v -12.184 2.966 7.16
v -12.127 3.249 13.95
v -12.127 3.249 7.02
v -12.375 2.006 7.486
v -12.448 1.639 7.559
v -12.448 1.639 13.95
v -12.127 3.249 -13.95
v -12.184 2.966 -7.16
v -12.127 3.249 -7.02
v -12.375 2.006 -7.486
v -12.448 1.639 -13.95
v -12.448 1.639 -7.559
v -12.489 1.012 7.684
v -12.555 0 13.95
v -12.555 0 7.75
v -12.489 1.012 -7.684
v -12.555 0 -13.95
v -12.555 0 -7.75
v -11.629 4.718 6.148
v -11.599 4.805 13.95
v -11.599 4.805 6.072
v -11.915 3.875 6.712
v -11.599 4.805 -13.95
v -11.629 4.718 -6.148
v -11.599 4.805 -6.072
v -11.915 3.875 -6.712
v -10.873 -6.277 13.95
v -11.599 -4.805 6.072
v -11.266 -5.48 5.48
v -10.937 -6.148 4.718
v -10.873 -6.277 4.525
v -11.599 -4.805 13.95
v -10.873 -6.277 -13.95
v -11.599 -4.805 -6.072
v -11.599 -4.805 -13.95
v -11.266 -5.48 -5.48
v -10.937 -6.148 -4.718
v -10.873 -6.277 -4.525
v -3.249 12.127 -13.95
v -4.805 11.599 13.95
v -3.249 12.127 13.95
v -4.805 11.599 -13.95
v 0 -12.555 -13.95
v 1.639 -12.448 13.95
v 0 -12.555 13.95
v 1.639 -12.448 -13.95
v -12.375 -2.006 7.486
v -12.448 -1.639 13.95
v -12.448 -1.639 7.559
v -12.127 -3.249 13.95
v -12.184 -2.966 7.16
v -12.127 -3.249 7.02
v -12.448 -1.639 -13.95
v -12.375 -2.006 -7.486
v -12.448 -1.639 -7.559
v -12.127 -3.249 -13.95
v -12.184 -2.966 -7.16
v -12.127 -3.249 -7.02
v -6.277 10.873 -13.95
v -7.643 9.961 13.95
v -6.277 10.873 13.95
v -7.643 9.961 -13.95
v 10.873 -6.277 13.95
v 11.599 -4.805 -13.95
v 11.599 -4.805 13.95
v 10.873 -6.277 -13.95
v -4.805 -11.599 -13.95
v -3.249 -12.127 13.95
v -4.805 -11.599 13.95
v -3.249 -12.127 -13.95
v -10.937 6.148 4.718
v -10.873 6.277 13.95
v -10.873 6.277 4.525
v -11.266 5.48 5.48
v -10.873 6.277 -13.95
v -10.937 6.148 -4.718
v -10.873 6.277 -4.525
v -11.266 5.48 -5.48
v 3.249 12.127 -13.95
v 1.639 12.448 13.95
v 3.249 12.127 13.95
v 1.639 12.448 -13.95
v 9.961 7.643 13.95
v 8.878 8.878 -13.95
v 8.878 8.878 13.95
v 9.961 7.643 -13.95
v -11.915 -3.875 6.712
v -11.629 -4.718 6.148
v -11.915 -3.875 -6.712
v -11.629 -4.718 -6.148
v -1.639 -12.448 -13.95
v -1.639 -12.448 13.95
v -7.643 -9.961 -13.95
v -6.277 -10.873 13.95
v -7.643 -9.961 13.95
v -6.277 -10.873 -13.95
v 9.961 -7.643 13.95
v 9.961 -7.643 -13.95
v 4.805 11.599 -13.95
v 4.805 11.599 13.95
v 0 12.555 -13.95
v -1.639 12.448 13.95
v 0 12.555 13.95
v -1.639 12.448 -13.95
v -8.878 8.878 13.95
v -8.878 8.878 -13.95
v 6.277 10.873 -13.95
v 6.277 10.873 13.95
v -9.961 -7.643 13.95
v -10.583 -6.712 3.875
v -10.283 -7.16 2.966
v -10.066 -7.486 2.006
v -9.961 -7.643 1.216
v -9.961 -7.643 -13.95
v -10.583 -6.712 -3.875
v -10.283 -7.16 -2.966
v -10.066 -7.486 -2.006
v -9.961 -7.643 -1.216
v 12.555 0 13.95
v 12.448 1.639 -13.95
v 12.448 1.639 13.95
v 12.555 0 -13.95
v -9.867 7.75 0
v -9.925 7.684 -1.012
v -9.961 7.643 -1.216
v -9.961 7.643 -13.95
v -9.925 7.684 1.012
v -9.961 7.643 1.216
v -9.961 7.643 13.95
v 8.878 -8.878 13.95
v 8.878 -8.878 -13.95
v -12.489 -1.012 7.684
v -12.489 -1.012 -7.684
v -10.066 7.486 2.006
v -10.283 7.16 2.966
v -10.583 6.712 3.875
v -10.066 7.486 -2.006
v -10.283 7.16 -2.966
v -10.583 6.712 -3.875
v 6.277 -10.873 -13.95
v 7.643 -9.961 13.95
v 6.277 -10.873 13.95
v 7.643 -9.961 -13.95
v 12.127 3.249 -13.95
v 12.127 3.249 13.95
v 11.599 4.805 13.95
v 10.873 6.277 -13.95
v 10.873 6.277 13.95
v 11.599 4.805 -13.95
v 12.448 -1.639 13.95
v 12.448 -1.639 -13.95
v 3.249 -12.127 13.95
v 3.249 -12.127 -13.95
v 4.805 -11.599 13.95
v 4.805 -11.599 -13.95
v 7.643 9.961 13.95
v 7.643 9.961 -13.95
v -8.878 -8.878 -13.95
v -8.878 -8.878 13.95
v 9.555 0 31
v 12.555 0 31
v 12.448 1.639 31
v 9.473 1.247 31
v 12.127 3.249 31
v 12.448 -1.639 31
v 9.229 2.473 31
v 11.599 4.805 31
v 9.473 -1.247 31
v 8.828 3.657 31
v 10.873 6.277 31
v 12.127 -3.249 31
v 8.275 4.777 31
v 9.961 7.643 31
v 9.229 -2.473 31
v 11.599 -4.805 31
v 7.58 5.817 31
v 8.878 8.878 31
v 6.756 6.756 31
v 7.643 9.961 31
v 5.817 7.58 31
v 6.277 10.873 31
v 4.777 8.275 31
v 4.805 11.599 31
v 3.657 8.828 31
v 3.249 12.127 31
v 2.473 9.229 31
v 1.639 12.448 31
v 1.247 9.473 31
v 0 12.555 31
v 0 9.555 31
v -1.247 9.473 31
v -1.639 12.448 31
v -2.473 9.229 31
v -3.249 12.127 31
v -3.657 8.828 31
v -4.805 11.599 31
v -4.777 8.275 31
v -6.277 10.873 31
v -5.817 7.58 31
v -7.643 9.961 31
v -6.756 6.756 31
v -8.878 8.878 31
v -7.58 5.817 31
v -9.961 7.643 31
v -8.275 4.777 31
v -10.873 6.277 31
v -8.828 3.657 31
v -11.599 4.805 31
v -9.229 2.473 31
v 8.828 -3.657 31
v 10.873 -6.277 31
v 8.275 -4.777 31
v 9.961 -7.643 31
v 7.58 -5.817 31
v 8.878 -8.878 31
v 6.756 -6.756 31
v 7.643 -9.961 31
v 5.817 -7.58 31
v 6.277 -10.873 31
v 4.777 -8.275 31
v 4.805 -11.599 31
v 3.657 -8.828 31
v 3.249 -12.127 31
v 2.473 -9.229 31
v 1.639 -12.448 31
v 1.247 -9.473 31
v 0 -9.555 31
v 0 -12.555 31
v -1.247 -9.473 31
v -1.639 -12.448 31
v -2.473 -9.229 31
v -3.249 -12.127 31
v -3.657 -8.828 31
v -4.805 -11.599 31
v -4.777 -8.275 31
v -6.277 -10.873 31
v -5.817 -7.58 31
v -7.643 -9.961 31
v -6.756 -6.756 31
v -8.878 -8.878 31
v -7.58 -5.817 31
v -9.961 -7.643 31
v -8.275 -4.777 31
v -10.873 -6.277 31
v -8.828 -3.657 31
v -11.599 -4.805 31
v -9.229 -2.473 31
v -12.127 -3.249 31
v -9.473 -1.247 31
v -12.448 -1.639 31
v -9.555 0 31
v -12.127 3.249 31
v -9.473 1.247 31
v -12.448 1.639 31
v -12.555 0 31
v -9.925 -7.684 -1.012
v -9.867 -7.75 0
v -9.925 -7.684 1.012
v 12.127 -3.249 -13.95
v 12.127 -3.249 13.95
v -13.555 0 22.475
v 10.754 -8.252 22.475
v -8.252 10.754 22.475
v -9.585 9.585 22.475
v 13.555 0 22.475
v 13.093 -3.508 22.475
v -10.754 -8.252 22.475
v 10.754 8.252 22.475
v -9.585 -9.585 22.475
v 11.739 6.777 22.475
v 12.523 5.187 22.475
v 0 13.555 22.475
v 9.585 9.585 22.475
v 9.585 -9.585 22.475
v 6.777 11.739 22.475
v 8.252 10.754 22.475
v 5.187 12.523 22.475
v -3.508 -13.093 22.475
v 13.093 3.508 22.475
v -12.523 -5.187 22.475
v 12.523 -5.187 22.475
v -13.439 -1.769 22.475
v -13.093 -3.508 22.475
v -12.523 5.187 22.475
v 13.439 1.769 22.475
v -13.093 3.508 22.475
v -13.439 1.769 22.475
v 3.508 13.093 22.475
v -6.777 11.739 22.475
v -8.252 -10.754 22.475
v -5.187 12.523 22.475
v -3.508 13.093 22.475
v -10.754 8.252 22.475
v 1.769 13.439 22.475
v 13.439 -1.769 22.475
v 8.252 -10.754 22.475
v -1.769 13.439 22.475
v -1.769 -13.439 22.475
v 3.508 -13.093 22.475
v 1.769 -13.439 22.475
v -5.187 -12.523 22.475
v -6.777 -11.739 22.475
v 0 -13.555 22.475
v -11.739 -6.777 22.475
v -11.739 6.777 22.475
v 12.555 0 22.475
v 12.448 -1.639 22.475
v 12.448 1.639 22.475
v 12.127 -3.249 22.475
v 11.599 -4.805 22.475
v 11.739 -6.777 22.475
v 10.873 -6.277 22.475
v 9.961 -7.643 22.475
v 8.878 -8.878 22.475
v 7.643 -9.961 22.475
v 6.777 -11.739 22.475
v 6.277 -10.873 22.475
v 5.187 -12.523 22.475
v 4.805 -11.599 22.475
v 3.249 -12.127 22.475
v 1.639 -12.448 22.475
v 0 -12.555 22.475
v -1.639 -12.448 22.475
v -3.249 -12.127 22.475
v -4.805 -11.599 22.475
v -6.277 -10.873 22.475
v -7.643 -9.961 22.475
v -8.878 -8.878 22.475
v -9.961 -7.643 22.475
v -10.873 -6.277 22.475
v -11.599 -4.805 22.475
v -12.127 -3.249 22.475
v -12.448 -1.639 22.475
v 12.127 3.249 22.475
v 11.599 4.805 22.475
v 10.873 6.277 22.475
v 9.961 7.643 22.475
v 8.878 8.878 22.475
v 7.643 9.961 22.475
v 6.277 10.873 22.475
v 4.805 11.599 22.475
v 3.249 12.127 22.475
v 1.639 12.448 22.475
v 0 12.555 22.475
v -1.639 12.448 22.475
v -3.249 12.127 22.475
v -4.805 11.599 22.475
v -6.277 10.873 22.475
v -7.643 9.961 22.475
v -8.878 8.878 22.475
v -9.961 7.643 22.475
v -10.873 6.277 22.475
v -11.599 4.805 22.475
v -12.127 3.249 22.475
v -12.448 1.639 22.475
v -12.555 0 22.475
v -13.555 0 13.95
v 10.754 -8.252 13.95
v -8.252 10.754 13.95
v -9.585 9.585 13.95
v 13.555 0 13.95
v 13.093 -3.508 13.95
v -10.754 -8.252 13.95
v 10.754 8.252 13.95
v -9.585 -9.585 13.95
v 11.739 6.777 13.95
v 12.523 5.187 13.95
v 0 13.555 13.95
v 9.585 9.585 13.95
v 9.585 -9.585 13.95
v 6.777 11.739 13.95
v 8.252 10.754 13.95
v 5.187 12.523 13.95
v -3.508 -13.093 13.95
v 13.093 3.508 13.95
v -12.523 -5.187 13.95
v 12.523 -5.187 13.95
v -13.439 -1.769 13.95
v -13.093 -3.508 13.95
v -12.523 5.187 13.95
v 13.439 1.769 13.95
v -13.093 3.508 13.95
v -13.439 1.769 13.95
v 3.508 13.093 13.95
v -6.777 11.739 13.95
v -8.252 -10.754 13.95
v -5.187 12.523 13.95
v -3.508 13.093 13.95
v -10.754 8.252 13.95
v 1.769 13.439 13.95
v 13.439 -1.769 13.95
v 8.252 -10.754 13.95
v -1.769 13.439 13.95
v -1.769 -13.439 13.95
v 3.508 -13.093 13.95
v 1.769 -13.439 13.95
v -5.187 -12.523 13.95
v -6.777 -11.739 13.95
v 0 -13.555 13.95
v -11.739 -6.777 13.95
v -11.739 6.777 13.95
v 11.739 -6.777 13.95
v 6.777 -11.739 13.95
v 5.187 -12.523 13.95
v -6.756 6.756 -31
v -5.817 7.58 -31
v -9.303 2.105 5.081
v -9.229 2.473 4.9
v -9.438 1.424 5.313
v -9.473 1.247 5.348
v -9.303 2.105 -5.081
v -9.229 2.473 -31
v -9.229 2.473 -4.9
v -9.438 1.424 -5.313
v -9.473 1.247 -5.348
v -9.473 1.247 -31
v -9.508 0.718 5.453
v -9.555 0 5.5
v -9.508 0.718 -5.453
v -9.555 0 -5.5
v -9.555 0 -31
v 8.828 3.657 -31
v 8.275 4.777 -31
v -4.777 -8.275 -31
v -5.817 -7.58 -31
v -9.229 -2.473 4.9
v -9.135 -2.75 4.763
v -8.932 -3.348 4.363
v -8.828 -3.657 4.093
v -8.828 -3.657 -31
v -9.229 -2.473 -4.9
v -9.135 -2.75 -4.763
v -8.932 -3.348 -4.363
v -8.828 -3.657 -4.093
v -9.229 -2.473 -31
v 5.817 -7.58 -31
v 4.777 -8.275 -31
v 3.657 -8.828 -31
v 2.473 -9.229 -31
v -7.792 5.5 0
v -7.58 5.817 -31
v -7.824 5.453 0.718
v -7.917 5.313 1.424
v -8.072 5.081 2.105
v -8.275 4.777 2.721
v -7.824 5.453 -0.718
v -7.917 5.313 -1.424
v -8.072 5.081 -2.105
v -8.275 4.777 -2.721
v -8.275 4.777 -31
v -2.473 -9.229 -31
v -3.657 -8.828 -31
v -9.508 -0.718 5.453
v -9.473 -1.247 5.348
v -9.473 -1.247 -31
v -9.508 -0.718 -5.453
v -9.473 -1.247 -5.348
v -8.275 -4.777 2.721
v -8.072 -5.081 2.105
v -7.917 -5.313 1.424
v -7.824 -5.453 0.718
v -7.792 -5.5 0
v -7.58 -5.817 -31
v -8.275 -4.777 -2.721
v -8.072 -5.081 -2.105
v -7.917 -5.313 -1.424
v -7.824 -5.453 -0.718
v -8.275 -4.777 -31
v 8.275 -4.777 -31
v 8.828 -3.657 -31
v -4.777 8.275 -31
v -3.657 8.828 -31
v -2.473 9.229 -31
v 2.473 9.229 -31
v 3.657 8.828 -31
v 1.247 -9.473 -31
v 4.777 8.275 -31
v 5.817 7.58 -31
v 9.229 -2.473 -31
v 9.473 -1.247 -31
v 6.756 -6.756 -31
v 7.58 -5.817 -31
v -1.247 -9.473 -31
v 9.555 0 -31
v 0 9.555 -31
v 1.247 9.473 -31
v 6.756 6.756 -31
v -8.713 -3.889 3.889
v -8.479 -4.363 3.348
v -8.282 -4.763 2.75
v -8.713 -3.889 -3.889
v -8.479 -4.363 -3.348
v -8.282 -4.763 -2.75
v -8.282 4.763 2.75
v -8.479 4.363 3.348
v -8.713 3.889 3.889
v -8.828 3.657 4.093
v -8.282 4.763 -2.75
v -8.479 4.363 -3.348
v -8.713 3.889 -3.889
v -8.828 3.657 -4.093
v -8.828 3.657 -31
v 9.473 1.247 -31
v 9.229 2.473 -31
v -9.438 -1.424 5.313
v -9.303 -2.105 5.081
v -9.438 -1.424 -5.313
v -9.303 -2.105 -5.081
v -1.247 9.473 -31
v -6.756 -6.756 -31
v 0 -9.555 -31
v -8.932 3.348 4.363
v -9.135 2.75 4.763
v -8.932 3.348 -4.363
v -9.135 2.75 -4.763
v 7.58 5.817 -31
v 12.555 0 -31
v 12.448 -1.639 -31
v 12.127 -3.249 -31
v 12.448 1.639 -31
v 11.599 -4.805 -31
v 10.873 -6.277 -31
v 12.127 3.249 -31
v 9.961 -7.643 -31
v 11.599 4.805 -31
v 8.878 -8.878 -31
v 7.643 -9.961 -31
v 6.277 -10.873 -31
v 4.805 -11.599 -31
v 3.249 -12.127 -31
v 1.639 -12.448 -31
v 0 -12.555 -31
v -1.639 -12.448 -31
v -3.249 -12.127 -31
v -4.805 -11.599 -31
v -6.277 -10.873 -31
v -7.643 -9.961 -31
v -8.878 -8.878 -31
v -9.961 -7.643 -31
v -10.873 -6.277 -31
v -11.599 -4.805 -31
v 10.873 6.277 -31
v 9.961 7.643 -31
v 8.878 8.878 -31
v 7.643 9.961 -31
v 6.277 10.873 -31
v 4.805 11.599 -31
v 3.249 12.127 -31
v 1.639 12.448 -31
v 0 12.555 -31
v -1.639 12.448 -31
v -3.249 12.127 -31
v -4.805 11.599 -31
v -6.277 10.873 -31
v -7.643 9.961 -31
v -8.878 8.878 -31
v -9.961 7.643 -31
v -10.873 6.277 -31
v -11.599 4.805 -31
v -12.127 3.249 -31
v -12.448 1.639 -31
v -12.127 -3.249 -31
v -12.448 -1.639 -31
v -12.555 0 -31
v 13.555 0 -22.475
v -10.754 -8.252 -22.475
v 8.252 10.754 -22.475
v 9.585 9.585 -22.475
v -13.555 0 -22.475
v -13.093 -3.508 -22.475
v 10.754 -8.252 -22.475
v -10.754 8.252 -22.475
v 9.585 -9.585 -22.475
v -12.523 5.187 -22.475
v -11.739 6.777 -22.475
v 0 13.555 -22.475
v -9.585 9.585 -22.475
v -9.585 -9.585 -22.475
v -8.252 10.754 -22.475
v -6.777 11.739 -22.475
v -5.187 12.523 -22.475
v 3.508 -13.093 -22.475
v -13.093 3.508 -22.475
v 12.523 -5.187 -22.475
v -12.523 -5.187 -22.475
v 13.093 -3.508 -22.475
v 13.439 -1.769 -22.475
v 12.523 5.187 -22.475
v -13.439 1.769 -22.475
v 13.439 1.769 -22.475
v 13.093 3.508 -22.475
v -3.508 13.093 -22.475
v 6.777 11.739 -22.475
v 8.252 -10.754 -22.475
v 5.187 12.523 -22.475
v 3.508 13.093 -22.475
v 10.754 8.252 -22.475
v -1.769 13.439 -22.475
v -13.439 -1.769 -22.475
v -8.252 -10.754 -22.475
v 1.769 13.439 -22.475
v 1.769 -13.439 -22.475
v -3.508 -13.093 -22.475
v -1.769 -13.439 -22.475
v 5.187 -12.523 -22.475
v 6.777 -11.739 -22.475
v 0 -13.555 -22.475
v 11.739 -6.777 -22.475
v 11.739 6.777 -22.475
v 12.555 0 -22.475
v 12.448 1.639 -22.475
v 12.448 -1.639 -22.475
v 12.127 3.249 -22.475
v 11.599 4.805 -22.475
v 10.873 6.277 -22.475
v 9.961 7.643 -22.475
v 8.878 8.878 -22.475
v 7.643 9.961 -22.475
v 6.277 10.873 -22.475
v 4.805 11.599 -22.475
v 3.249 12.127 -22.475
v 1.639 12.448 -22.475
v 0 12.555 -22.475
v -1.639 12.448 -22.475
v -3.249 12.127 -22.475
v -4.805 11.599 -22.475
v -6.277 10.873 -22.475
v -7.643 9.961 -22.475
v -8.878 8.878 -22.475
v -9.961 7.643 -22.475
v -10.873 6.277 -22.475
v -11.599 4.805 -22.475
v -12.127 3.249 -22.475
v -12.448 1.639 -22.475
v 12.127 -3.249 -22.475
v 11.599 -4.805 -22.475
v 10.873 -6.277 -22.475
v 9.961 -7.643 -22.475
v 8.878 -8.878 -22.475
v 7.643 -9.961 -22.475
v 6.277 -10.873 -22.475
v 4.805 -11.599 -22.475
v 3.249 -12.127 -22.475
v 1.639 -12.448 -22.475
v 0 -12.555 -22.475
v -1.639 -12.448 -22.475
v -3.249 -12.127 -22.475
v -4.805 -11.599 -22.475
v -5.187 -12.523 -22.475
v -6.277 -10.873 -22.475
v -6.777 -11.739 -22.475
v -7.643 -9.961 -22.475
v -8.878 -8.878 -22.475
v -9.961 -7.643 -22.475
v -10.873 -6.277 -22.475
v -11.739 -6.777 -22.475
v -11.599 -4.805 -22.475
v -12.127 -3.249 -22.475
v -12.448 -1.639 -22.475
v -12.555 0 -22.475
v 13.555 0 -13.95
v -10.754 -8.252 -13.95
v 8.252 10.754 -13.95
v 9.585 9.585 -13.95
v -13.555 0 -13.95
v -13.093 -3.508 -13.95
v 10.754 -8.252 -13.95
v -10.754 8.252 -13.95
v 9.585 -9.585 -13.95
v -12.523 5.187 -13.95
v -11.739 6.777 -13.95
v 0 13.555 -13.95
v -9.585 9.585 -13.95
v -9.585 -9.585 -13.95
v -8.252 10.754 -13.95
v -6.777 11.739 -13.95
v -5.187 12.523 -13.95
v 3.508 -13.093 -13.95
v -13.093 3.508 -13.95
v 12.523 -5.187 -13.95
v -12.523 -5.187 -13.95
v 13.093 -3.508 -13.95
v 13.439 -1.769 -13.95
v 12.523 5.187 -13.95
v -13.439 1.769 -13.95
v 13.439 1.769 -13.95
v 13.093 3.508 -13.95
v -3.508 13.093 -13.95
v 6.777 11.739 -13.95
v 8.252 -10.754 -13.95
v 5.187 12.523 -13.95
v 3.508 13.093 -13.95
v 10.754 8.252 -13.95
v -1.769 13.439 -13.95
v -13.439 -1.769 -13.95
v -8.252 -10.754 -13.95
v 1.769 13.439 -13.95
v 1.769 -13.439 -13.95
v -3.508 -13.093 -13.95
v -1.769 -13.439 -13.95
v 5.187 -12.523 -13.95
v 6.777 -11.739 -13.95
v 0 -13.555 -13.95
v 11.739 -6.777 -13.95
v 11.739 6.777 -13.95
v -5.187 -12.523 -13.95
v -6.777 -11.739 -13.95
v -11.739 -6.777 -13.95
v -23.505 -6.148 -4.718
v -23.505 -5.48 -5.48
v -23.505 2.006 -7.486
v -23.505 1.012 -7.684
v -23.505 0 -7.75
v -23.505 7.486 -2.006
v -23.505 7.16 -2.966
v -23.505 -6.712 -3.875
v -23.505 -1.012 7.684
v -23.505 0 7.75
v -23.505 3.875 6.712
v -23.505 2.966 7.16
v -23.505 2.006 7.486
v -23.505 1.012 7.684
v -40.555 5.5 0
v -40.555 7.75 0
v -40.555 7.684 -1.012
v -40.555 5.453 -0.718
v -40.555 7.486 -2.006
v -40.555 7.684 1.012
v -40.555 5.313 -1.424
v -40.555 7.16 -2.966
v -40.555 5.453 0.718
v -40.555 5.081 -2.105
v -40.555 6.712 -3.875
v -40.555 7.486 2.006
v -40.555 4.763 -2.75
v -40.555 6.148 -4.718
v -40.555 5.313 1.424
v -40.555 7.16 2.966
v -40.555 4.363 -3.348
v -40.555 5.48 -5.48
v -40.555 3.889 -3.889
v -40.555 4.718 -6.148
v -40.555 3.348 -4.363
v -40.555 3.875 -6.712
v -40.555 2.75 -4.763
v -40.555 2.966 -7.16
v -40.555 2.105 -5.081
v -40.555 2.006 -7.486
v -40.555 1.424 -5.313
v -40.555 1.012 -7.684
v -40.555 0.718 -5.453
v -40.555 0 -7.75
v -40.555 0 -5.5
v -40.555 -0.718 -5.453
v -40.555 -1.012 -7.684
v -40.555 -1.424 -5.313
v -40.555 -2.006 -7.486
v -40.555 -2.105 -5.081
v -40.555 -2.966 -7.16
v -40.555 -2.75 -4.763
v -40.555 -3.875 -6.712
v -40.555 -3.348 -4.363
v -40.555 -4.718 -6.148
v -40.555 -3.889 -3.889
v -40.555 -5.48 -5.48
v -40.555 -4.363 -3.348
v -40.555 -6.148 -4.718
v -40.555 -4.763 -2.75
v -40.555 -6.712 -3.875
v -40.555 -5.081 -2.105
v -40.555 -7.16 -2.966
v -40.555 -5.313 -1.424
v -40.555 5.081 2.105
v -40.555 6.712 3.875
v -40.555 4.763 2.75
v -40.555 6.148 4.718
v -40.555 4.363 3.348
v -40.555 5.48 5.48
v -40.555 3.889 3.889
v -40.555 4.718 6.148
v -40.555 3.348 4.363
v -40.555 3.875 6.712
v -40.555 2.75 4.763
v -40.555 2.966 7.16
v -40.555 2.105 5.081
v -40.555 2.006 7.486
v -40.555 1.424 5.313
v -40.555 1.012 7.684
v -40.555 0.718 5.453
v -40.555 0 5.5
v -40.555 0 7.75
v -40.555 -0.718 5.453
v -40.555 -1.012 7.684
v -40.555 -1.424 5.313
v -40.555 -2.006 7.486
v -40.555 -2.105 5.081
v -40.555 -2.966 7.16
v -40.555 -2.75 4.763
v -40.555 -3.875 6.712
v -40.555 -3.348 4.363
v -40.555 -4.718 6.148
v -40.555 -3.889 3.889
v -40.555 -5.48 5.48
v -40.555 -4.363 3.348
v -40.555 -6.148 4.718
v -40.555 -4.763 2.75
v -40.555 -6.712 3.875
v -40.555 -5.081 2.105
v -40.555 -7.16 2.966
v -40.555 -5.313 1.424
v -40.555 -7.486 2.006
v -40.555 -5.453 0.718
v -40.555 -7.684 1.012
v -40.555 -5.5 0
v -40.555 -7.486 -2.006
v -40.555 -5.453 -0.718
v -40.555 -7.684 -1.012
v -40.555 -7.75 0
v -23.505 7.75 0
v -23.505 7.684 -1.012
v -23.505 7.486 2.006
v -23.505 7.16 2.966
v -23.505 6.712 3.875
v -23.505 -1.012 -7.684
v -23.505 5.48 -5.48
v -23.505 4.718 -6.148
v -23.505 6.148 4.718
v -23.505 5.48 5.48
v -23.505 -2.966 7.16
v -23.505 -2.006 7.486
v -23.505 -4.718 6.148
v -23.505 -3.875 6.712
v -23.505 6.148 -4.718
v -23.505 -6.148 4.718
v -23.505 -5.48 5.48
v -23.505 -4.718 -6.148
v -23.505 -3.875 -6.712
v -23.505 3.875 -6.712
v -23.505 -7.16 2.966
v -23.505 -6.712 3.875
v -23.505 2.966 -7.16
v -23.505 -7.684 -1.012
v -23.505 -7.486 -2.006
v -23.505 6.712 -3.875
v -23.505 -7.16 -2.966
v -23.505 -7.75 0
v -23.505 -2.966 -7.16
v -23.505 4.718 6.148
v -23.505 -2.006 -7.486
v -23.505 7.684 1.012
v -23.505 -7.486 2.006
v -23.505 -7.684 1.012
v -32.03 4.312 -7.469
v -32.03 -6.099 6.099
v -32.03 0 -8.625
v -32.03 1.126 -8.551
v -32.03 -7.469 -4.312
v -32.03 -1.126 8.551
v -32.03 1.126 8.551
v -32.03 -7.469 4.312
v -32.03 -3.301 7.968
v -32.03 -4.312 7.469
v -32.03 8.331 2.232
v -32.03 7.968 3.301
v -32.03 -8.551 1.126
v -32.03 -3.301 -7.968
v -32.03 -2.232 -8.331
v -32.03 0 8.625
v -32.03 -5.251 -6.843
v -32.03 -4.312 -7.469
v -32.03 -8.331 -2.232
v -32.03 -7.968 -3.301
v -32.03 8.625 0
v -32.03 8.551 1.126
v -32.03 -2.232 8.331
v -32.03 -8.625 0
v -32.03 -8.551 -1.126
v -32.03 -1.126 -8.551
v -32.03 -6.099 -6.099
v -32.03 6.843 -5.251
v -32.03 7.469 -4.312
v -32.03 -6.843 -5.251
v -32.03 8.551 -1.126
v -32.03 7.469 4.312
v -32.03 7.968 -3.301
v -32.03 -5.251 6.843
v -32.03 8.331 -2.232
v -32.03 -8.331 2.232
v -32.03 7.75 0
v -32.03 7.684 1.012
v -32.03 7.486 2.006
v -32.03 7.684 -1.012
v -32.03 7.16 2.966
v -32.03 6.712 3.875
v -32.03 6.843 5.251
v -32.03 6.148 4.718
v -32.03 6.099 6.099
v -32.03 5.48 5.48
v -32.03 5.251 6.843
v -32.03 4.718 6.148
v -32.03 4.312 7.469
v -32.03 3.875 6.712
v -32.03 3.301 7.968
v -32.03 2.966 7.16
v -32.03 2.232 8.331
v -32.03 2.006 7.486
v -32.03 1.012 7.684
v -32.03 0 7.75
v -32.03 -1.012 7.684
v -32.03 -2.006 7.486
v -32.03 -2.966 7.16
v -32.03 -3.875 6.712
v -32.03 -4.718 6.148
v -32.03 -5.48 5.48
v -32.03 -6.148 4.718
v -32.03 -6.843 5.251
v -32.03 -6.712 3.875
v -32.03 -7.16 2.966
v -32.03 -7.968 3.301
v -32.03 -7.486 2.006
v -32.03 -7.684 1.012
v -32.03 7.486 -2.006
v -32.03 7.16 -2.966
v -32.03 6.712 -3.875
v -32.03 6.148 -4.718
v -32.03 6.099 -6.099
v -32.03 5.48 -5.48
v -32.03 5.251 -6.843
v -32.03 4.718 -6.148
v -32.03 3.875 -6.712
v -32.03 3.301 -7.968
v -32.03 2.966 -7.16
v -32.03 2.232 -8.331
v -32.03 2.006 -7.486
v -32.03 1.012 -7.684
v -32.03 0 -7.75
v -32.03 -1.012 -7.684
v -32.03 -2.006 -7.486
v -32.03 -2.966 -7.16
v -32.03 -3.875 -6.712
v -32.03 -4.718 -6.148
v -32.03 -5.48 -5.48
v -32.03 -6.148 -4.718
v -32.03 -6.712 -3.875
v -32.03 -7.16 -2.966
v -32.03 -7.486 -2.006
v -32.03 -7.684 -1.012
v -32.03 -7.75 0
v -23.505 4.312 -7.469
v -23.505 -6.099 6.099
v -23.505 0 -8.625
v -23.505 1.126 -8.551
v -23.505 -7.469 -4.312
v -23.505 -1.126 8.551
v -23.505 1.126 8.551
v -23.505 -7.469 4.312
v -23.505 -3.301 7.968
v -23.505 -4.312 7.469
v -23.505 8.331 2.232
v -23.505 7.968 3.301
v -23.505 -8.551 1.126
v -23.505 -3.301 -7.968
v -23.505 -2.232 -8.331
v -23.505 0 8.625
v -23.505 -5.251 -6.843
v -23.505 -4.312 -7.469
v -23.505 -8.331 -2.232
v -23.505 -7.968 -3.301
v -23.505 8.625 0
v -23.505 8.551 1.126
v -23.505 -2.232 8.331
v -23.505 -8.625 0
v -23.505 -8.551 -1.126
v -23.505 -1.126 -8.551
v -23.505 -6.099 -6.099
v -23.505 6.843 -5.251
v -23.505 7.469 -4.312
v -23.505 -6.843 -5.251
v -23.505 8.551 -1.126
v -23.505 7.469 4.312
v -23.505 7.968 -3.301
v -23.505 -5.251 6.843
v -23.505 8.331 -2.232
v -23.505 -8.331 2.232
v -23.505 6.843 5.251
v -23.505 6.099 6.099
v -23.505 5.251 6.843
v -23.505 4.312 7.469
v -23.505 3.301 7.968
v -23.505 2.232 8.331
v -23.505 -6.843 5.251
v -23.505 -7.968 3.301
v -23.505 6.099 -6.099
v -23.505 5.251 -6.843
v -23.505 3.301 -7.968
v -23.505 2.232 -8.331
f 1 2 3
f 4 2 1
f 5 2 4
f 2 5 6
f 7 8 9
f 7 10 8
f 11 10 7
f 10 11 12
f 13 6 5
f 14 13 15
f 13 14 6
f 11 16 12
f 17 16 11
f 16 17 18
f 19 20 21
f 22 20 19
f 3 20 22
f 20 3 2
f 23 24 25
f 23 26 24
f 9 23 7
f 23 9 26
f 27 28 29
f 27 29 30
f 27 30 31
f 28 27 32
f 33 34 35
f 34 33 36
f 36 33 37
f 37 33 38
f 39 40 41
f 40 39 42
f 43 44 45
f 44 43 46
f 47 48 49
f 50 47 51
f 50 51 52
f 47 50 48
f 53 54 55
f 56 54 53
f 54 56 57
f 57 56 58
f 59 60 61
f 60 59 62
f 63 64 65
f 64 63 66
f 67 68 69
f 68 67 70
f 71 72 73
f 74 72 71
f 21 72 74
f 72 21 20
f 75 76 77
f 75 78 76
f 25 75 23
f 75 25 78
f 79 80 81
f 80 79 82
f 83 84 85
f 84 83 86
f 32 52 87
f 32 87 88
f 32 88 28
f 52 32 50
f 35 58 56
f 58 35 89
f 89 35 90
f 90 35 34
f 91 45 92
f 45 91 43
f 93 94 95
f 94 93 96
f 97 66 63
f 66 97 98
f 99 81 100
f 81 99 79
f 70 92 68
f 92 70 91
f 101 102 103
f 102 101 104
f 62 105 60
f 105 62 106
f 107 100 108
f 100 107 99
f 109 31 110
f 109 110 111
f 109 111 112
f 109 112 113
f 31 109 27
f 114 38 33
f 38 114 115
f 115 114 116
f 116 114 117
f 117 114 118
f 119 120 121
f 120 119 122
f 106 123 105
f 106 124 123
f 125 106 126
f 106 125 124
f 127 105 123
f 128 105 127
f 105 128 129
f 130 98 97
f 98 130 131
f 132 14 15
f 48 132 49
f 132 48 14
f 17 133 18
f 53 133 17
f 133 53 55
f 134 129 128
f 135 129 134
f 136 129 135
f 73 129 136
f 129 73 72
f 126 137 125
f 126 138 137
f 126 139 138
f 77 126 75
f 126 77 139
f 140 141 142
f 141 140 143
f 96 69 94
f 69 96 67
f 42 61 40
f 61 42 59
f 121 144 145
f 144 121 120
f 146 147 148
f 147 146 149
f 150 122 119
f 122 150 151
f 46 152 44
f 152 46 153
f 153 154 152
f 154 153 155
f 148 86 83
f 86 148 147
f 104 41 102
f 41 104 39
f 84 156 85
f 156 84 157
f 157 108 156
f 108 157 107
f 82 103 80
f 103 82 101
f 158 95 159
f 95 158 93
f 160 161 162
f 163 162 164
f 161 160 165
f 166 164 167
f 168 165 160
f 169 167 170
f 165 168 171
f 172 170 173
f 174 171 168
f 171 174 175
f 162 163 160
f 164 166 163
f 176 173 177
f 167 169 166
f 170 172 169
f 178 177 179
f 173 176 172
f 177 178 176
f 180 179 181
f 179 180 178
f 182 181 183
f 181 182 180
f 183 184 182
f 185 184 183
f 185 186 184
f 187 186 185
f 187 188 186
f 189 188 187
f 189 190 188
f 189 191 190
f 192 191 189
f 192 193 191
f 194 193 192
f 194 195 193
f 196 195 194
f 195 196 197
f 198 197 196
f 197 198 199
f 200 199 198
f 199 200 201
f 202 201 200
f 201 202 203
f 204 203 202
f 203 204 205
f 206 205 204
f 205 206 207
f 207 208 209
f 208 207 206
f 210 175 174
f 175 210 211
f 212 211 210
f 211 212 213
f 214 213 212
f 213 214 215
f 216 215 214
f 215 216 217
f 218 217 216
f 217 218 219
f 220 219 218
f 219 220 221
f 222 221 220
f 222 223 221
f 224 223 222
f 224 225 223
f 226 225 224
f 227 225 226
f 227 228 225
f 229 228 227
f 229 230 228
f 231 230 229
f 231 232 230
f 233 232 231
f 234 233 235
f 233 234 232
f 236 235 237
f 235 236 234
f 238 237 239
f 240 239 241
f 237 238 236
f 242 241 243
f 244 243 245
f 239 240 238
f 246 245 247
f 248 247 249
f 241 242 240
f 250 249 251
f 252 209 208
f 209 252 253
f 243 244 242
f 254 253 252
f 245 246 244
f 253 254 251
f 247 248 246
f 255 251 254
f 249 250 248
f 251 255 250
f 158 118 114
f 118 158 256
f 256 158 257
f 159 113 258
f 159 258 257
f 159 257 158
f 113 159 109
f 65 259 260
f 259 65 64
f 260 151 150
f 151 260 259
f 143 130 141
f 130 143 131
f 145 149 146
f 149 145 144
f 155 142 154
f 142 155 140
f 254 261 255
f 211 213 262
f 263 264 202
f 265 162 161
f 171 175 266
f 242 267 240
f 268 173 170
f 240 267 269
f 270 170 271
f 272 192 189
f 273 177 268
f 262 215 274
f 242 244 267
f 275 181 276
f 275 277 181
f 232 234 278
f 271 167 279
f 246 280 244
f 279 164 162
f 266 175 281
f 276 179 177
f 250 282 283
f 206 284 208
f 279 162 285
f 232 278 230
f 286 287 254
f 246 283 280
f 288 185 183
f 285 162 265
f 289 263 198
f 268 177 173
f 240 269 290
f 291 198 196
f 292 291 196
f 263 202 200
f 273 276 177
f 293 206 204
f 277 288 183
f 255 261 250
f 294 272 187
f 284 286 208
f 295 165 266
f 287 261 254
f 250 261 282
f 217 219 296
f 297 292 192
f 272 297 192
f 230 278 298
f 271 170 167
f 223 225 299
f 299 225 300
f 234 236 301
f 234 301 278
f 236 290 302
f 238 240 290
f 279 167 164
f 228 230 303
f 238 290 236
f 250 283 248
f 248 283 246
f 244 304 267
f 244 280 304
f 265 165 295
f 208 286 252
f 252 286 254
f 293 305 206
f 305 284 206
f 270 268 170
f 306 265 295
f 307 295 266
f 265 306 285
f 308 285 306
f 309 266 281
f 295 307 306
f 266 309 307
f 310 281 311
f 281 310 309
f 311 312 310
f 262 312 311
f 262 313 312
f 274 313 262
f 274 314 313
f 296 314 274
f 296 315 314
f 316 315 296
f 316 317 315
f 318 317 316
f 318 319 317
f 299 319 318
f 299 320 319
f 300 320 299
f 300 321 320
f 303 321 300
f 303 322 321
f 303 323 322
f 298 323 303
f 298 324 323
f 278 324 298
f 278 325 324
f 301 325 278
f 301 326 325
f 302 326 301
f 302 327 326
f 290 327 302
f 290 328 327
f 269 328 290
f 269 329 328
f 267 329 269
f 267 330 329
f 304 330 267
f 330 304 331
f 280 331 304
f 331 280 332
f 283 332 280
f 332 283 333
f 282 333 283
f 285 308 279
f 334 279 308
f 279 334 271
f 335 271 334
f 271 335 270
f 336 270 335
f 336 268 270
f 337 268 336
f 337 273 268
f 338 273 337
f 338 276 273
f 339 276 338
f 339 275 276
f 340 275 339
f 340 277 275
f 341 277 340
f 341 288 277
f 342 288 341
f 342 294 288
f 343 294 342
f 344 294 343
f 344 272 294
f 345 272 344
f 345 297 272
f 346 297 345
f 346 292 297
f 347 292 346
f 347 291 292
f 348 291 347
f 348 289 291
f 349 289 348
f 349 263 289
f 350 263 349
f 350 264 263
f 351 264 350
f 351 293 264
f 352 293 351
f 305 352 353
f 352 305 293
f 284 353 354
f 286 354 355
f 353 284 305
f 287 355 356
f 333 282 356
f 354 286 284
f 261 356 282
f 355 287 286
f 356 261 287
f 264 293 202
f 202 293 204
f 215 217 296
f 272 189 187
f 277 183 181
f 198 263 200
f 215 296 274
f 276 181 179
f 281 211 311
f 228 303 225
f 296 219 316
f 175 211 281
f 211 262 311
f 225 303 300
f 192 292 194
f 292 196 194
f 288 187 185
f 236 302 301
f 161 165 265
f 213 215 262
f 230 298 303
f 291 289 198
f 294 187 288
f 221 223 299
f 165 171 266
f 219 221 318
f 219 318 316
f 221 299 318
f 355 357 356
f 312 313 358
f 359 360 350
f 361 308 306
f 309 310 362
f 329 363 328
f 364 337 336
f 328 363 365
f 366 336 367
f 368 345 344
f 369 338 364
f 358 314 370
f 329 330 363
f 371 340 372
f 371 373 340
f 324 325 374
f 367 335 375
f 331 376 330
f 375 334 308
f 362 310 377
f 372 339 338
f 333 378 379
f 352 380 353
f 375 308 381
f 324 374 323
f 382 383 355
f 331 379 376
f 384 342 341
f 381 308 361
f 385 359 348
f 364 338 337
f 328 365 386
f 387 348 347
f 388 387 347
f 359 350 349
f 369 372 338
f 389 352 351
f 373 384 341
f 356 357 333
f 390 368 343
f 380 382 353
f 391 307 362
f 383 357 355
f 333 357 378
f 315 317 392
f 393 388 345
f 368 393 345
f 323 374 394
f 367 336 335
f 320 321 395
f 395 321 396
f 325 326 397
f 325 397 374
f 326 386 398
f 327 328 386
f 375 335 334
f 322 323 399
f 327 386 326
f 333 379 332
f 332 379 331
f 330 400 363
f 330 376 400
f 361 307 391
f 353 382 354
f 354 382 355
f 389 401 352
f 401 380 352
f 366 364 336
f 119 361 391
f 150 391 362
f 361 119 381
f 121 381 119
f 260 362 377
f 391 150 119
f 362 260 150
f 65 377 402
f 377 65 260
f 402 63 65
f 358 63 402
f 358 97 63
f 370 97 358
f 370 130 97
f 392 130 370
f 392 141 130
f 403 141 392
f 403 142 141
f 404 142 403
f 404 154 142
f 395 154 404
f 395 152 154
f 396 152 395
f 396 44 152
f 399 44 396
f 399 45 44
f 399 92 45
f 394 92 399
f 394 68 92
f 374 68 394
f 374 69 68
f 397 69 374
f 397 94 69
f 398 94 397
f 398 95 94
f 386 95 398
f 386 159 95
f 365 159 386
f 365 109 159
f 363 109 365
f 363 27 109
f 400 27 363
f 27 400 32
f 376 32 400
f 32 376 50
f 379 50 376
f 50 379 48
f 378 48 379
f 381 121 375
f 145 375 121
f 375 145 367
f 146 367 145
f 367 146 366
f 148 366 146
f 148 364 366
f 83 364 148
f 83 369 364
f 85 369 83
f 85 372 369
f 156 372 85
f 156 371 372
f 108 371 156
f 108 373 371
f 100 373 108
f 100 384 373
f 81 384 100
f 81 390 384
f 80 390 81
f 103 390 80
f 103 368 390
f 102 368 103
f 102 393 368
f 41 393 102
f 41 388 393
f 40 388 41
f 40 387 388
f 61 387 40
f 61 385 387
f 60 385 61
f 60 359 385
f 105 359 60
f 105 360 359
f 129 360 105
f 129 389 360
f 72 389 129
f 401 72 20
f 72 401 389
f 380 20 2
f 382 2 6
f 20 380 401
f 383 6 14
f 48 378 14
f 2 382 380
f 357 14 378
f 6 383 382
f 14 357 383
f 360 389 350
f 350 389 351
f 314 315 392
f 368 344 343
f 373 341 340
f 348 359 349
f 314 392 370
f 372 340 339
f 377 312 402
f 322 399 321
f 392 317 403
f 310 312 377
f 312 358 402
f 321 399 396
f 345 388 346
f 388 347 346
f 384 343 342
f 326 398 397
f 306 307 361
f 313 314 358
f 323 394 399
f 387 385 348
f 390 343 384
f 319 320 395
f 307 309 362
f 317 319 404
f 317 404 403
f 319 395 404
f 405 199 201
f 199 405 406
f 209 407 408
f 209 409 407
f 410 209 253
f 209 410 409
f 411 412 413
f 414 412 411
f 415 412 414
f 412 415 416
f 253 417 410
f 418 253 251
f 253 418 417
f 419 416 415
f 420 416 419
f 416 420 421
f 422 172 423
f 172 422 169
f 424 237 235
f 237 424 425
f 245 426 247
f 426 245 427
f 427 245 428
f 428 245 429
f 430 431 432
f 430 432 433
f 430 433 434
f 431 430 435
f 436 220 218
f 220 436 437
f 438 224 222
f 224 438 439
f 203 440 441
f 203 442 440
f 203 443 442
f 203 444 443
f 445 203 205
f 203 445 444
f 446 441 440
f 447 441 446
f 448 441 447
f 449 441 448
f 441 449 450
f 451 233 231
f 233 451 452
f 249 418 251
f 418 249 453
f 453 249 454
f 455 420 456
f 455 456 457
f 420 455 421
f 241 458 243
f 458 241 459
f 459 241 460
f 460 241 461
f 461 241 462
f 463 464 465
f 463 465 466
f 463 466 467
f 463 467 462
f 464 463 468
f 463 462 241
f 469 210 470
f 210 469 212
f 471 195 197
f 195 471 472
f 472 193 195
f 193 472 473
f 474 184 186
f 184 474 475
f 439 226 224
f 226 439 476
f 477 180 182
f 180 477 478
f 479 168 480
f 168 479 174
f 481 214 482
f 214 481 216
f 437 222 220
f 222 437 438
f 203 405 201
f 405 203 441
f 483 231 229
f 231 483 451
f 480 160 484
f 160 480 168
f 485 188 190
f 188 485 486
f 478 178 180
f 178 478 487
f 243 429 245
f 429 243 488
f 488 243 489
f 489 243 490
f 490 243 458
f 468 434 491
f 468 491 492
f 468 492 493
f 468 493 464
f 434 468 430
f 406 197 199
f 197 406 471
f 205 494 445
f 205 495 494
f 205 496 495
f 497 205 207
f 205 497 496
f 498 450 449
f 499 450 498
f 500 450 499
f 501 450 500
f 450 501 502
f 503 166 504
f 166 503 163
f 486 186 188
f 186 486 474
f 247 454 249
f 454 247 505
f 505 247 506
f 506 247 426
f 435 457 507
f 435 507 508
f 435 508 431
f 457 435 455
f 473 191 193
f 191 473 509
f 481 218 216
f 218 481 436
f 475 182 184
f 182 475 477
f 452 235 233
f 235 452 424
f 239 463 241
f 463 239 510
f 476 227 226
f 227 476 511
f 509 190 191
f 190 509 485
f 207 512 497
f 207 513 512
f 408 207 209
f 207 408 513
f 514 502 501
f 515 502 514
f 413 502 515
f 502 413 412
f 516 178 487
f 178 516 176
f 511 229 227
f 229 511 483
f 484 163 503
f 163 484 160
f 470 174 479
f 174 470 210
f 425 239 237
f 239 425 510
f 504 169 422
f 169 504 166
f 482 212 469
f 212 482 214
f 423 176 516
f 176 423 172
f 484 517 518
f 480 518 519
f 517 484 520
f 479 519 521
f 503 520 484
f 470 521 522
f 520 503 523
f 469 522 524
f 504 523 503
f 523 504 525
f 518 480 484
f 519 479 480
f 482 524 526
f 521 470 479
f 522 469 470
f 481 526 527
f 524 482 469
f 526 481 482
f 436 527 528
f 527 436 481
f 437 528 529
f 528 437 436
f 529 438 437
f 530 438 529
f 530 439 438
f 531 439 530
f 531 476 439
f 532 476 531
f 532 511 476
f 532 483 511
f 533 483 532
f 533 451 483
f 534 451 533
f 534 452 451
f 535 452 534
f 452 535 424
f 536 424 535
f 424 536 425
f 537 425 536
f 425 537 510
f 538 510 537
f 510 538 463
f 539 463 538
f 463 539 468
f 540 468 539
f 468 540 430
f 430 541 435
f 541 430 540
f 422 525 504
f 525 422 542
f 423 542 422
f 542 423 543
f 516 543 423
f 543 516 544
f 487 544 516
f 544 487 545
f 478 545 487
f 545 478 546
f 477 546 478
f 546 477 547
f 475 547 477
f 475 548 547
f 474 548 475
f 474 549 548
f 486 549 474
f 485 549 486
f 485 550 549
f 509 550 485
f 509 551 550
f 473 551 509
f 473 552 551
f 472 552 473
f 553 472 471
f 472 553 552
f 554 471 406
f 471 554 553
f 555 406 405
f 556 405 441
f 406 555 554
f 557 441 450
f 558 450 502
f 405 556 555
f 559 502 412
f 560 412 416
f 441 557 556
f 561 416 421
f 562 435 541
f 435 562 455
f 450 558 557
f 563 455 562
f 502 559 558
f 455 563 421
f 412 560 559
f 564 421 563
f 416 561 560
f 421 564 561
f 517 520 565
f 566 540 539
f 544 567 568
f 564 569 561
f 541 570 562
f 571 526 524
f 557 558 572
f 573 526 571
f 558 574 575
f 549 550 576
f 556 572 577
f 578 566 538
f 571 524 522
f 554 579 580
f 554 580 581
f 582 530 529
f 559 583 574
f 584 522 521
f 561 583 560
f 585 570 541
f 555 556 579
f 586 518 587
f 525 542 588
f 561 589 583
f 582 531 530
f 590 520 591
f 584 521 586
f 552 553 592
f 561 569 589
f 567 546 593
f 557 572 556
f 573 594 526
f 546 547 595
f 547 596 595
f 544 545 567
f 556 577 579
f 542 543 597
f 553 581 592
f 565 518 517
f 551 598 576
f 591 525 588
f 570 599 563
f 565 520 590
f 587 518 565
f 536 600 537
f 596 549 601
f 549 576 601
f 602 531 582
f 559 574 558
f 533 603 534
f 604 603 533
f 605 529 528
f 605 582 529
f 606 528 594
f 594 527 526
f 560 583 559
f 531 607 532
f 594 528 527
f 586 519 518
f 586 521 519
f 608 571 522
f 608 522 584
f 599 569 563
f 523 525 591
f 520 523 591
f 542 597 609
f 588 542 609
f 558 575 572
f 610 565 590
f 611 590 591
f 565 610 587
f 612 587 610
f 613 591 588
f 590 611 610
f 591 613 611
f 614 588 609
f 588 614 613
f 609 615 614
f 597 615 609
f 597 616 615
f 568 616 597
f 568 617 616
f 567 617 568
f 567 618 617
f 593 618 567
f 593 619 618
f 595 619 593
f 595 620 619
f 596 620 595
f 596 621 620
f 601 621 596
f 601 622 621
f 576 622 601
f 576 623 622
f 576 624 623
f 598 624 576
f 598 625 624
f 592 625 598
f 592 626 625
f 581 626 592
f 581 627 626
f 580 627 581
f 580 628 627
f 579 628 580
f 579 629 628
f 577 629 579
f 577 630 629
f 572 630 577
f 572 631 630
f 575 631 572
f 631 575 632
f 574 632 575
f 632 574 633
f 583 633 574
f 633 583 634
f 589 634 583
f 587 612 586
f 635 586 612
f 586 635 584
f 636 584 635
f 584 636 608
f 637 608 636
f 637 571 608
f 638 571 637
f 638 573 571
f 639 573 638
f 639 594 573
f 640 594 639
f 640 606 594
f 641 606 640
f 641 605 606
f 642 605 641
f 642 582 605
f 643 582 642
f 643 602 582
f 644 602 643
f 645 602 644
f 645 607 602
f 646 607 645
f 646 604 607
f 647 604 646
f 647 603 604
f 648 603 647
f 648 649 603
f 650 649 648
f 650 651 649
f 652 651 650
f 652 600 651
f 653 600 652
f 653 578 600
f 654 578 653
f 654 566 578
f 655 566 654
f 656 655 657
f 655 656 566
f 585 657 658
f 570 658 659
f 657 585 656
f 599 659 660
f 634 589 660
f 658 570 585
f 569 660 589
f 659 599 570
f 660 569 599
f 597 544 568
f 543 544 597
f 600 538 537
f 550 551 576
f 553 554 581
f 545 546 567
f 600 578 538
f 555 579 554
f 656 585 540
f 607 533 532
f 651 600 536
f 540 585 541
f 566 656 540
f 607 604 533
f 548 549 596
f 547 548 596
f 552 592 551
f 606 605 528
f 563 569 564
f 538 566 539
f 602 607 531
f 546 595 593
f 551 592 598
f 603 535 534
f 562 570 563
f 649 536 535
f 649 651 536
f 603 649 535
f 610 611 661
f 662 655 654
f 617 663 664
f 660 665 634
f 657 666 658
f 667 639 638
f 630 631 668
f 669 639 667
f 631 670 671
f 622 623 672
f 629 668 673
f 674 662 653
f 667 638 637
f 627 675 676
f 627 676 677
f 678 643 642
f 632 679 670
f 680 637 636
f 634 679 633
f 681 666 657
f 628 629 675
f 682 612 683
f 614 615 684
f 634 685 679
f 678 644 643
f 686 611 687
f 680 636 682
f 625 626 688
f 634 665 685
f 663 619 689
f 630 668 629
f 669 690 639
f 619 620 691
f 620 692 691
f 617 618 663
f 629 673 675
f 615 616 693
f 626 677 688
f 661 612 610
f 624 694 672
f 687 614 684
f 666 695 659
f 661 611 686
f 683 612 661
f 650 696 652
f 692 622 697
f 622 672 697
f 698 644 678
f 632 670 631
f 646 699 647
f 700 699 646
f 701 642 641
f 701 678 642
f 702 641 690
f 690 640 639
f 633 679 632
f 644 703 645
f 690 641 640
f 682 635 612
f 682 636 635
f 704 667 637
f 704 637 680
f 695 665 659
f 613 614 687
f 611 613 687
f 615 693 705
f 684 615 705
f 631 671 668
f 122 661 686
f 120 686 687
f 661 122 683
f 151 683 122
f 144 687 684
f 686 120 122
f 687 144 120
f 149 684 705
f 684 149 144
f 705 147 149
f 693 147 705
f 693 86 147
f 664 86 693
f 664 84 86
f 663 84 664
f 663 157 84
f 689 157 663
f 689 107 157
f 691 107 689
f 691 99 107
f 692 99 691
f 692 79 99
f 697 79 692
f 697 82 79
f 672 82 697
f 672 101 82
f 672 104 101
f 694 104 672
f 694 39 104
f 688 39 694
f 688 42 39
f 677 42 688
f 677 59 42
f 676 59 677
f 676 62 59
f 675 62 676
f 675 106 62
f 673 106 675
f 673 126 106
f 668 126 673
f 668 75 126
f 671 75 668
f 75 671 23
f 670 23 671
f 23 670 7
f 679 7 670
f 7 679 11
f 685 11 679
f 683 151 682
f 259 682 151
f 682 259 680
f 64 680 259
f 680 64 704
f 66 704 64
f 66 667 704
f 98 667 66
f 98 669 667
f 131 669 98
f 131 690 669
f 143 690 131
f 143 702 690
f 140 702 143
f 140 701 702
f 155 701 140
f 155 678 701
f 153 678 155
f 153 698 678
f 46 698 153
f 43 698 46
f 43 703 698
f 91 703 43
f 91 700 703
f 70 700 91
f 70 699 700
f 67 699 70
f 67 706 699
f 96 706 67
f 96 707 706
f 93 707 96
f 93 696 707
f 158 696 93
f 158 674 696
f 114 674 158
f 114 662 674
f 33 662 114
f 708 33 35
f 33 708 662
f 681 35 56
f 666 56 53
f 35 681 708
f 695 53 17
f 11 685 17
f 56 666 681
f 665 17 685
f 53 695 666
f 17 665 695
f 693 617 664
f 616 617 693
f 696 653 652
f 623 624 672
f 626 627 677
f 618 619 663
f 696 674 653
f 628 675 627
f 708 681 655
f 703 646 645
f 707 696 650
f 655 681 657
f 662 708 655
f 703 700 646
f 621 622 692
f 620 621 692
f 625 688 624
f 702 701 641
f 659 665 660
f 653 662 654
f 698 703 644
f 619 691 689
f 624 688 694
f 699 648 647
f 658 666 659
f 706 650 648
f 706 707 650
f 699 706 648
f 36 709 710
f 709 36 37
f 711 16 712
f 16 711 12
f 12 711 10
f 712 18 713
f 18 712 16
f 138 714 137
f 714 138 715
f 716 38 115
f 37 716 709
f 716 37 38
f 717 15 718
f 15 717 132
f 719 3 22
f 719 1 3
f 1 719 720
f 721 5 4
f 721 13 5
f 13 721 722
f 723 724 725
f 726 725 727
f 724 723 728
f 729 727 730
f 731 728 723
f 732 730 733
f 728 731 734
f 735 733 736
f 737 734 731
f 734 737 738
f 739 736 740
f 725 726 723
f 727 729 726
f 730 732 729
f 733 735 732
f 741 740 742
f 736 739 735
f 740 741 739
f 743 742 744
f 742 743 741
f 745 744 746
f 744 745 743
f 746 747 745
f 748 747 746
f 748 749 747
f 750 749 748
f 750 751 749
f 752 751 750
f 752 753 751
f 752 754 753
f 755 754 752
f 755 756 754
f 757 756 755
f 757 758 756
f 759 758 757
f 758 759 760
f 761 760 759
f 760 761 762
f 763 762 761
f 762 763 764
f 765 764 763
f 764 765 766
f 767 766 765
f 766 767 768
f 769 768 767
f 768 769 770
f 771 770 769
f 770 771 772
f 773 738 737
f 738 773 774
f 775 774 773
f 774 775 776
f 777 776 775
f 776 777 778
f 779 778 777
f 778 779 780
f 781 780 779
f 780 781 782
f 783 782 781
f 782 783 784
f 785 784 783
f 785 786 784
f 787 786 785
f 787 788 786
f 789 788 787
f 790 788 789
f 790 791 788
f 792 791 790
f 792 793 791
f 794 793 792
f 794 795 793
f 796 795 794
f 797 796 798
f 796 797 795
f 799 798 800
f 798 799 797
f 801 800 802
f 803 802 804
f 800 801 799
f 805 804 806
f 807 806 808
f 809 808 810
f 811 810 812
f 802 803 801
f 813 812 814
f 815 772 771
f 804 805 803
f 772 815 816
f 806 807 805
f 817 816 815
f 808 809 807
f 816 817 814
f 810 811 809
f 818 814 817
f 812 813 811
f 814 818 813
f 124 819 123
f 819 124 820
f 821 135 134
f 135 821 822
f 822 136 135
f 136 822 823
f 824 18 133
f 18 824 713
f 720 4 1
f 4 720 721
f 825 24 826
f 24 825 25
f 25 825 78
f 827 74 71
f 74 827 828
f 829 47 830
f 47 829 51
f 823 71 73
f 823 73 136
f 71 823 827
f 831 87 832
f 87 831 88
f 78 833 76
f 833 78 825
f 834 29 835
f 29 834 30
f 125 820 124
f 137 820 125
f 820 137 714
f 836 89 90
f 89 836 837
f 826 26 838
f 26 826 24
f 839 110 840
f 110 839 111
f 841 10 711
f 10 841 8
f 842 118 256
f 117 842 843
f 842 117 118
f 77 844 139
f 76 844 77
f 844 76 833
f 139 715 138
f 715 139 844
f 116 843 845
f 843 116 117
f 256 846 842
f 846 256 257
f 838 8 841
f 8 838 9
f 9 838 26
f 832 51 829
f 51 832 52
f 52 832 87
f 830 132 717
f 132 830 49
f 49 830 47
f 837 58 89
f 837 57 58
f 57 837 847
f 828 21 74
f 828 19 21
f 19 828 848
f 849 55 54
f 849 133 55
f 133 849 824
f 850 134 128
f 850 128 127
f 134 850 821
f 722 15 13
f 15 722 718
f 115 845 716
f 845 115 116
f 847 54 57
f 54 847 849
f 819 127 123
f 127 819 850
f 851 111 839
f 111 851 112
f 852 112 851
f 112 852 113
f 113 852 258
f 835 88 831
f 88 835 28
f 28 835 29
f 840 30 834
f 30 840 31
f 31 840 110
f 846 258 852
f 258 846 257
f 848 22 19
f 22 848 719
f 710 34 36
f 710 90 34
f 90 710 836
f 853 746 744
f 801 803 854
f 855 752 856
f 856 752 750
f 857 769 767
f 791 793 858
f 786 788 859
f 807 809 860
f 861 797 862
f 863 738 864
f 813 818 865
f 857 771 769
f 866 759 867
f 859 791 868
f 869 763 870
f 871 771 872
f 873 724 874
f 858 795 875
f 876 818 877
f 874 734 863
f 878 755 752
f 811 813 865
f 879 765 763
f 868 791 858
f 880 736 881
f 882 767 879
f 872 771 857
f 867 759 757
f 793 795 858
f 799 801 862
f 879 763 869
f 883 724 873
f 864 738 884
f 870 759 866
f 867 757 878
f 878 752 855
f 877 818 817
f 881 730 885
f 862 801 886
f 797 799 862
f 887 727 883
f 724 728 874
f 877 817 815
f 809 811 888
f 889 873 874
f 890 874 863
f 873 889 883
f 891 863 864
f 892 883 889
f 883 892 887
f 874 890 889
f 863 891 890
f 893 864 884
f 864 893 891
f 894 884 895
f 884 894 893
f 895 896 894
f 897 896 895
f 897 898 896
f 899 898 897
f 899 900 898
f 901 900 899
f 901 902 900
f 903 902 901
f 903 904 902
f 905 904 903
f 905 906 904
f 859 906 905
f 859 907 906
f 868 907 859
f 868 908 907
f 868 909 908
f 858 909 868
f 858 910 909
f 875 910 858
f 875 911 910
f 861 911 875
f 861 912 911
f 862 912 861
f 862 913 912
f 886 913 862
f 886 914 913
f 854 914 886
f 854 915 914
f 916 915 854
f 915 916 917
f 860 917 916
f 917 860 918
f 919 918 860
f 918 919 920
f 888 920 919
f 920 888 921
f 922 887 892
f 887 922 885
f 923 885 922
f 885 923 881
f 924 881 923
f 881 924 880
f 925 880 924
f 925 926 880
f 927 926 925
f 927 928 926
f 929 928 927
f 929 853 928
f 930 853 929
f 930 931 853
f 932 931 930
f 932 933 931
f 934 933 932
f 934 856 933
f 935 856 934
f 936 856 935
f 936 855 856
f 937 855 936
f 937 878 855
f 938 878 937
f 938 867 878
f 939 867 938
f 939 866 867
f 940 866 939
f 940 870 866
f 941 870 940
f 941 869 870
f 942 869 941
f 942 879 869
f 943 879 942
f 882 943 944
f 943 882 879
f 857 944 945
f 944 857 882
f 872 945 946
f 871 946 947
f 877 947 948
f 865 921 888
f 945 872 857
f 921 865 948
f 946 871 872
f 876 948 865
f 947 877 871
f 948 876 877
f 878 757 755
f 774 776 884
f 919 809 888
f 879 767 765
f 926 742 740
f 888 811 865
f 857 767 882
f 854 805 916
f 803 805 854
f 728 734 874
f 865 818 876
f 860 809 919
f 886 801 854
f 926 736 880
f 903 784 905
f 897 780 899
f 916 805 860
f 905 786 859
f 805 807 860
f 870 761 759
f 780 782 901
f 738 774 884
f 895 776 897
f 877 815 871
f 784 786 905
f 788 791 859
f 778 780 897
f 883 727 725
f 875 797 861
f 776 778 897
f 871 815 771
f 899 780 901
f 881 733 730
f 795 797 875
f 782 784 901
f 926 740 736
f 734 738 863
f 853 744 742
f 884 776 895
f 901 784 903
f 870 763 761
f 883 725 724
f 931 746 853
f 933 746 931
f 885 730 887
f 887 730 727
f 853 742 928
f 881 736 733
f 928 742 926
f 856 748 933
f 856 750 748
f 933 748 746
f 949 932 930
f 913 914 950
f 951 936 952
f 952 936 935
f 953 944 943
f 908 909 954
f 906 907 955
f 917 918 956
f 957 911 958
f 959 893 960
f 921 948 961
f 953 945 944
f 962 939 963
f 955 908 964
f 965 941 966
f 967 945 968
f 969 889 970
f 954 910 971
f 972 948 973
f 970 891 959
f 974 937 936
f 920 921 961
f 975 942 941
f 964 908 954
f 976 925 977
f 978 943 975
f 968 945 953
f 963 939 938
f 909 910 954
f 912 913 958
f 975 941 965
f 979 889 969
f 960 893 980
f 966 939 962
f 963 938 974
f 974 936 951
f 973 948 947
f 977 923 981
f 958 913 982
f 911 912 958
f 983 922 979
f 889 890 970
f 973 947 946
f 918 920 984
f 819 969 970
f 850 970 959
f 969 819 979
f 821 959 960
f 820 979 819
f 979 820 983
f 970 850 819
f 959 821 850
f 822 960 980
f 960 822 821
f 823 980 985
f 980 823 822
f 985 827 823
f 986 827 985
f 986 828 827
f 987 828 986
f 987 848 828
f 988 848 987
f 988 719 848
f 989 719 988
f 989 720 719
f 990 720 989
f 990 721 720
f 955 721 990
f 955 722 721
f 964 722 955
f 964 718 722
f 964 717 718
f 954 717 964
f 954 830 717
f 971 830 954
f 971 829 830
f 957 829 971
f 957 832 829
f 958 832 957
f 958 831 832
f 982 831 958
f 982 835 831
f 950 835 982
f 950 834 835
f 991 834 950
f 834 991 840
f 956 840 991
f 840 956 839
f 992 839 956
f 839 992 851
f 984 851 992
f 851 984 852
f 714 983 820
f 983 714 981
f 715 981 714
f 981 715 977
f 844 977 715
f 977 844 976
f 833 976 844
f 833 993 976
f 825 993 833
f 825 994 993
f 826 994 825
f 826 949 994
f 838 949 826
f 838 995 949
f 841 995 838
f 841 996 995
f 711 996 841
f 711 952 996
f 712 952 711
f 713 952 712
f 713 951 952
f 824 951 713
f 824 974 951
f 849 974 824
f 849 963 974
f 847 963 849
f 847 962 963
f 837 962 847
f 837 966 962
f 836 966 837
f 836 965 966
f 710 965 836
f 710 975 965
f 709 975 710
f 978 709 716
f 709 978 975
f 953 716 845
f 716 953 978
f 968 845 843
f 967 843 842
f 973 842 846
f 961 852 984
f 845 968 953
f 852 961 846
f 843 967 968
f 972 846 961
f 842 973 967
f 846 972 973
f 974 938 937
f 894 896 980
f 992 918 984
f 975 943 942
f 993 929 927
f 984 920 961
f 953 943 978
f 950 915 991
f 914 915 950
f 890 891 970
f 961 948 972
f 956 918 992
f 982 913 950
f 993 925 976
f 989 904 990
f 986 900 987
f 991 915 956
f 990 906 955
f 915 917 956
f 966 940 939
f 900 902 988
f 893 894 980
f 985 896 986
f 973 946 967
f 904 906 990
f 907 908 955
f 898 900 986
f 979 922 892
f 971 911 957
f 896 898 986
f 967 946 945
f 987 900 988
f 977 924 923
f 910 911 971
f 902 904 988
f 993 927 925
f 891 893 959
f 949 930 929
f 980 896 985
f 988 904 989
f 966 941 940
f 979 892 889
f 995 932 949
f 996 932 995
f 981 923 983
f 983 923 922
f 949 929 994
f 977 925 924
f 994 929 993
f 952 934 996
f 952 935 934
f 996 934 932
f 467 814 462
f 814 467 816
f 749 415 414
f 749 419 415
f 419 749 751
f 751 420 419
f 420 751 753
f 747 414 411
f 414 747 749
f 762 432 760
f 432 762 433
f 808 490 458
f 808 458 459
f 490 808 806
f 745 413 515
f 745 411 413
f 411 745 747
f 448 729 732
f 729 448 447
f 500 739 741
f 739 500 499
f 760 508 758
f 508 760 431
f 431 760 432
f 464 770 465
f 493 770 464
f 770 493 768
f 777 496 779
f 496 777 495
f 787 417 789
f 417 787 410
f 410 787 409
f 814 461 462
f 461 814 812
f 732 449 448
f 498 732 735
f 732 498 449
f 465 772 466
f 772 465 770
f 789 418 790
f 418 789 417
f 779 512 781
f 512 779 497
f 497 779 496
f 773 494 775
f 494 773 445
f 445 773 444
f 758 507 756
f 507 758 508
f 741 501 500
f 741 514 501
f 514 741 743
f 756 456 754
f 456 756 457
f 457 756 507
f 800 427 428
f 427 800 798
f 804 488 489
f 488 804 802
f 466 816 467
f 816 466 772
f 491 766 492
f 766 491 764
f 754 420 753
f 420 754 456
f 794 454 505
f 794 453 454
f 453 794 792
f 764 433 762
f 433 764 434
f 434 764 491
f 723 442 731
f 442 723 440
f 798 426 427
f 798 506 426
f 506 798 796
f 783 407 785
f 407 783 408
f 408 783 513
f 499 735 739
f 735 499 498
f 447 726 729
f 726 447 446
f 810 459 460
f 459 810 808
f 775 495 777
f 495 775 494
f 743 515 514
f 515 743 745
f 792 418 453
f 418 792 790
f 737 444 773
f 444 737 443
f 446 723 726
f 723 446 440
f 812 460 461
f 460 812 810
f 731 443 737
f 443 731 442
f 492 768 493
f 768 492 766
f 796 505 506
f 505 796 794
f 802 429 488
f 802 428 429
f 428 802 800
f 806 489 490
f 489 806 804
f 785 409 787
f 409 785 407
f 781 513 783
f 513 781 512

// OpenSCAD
//Height of Tee
total_t_length=31*2;
//Diameter of main part of Tee
main_t_diameter=25.11;
//Height of barbs on Tee
main_t_barb_height=2;
//Wall thickness of main part of Tee
main_t_wall_thickness=3;

//Diameter of Tee portion of Tee
secondary_diameter=15.5;
//Height of barbs on Tee portion of Tee
secondary_barb_height=1.75;
//Wall thickness of Tee portion of Tee
secondary_wall_thickness=2.25;

difference() {
  union() {
    translate([0,0,total_t_length/2]){
      rotate(a=[0,180,0]){
        hose_barb(total_t_length/2, main_t_diameter, main_t_barb_height, main_t_wall_thickness);
      }
    }

    translate([0,0,-total_t_length/2]){
      rotate(a=[0,0,0]){
        hose_barb(total_t_length/2, main_t_diameter, main_t_barb_height, main_t_wall_thickness);
      }
    }
    translate([-(total_t_length/2 + main_t_diameter/2 - main_t_wall_thickness),0,0]){
      rotate(a=[0,90,0]){
        hose_barb(total_t_length/2, secondary_diameter, secondary_barb_height, secondary_wall_thickness);
      }
    }
  }
  rotate(a=[0,90,0]){
    translate([0,0,-total_t_length]){
      cylinder(h=total_t_length, d=secondary_diameter- (secondary_wall_thickness*2), $fn=48);
    }
  }
}



module hose_barb(height, diameter, barb_height, wall_thickness)
{ 
  end_barb_height = height - (height * 0.45);
  difference(){
    union(){
      cylinder(h=height,d=diameter,$fn=48);//pipe
      cylinder(h=end_barb_height/2,d1=diameter,d2=diameter+barb_height,$fn=48);//barb
      translate([0,0,end_barb_height/2]){
        cylinder(h=end_barb_height/2,d1=diameter,d2=diameter+barb_height,$fn=48);//barb
      }
    }
    cylinder(h=height,d=diameter - (wall_thickness*2),$fn=48);//hole
  }
}
